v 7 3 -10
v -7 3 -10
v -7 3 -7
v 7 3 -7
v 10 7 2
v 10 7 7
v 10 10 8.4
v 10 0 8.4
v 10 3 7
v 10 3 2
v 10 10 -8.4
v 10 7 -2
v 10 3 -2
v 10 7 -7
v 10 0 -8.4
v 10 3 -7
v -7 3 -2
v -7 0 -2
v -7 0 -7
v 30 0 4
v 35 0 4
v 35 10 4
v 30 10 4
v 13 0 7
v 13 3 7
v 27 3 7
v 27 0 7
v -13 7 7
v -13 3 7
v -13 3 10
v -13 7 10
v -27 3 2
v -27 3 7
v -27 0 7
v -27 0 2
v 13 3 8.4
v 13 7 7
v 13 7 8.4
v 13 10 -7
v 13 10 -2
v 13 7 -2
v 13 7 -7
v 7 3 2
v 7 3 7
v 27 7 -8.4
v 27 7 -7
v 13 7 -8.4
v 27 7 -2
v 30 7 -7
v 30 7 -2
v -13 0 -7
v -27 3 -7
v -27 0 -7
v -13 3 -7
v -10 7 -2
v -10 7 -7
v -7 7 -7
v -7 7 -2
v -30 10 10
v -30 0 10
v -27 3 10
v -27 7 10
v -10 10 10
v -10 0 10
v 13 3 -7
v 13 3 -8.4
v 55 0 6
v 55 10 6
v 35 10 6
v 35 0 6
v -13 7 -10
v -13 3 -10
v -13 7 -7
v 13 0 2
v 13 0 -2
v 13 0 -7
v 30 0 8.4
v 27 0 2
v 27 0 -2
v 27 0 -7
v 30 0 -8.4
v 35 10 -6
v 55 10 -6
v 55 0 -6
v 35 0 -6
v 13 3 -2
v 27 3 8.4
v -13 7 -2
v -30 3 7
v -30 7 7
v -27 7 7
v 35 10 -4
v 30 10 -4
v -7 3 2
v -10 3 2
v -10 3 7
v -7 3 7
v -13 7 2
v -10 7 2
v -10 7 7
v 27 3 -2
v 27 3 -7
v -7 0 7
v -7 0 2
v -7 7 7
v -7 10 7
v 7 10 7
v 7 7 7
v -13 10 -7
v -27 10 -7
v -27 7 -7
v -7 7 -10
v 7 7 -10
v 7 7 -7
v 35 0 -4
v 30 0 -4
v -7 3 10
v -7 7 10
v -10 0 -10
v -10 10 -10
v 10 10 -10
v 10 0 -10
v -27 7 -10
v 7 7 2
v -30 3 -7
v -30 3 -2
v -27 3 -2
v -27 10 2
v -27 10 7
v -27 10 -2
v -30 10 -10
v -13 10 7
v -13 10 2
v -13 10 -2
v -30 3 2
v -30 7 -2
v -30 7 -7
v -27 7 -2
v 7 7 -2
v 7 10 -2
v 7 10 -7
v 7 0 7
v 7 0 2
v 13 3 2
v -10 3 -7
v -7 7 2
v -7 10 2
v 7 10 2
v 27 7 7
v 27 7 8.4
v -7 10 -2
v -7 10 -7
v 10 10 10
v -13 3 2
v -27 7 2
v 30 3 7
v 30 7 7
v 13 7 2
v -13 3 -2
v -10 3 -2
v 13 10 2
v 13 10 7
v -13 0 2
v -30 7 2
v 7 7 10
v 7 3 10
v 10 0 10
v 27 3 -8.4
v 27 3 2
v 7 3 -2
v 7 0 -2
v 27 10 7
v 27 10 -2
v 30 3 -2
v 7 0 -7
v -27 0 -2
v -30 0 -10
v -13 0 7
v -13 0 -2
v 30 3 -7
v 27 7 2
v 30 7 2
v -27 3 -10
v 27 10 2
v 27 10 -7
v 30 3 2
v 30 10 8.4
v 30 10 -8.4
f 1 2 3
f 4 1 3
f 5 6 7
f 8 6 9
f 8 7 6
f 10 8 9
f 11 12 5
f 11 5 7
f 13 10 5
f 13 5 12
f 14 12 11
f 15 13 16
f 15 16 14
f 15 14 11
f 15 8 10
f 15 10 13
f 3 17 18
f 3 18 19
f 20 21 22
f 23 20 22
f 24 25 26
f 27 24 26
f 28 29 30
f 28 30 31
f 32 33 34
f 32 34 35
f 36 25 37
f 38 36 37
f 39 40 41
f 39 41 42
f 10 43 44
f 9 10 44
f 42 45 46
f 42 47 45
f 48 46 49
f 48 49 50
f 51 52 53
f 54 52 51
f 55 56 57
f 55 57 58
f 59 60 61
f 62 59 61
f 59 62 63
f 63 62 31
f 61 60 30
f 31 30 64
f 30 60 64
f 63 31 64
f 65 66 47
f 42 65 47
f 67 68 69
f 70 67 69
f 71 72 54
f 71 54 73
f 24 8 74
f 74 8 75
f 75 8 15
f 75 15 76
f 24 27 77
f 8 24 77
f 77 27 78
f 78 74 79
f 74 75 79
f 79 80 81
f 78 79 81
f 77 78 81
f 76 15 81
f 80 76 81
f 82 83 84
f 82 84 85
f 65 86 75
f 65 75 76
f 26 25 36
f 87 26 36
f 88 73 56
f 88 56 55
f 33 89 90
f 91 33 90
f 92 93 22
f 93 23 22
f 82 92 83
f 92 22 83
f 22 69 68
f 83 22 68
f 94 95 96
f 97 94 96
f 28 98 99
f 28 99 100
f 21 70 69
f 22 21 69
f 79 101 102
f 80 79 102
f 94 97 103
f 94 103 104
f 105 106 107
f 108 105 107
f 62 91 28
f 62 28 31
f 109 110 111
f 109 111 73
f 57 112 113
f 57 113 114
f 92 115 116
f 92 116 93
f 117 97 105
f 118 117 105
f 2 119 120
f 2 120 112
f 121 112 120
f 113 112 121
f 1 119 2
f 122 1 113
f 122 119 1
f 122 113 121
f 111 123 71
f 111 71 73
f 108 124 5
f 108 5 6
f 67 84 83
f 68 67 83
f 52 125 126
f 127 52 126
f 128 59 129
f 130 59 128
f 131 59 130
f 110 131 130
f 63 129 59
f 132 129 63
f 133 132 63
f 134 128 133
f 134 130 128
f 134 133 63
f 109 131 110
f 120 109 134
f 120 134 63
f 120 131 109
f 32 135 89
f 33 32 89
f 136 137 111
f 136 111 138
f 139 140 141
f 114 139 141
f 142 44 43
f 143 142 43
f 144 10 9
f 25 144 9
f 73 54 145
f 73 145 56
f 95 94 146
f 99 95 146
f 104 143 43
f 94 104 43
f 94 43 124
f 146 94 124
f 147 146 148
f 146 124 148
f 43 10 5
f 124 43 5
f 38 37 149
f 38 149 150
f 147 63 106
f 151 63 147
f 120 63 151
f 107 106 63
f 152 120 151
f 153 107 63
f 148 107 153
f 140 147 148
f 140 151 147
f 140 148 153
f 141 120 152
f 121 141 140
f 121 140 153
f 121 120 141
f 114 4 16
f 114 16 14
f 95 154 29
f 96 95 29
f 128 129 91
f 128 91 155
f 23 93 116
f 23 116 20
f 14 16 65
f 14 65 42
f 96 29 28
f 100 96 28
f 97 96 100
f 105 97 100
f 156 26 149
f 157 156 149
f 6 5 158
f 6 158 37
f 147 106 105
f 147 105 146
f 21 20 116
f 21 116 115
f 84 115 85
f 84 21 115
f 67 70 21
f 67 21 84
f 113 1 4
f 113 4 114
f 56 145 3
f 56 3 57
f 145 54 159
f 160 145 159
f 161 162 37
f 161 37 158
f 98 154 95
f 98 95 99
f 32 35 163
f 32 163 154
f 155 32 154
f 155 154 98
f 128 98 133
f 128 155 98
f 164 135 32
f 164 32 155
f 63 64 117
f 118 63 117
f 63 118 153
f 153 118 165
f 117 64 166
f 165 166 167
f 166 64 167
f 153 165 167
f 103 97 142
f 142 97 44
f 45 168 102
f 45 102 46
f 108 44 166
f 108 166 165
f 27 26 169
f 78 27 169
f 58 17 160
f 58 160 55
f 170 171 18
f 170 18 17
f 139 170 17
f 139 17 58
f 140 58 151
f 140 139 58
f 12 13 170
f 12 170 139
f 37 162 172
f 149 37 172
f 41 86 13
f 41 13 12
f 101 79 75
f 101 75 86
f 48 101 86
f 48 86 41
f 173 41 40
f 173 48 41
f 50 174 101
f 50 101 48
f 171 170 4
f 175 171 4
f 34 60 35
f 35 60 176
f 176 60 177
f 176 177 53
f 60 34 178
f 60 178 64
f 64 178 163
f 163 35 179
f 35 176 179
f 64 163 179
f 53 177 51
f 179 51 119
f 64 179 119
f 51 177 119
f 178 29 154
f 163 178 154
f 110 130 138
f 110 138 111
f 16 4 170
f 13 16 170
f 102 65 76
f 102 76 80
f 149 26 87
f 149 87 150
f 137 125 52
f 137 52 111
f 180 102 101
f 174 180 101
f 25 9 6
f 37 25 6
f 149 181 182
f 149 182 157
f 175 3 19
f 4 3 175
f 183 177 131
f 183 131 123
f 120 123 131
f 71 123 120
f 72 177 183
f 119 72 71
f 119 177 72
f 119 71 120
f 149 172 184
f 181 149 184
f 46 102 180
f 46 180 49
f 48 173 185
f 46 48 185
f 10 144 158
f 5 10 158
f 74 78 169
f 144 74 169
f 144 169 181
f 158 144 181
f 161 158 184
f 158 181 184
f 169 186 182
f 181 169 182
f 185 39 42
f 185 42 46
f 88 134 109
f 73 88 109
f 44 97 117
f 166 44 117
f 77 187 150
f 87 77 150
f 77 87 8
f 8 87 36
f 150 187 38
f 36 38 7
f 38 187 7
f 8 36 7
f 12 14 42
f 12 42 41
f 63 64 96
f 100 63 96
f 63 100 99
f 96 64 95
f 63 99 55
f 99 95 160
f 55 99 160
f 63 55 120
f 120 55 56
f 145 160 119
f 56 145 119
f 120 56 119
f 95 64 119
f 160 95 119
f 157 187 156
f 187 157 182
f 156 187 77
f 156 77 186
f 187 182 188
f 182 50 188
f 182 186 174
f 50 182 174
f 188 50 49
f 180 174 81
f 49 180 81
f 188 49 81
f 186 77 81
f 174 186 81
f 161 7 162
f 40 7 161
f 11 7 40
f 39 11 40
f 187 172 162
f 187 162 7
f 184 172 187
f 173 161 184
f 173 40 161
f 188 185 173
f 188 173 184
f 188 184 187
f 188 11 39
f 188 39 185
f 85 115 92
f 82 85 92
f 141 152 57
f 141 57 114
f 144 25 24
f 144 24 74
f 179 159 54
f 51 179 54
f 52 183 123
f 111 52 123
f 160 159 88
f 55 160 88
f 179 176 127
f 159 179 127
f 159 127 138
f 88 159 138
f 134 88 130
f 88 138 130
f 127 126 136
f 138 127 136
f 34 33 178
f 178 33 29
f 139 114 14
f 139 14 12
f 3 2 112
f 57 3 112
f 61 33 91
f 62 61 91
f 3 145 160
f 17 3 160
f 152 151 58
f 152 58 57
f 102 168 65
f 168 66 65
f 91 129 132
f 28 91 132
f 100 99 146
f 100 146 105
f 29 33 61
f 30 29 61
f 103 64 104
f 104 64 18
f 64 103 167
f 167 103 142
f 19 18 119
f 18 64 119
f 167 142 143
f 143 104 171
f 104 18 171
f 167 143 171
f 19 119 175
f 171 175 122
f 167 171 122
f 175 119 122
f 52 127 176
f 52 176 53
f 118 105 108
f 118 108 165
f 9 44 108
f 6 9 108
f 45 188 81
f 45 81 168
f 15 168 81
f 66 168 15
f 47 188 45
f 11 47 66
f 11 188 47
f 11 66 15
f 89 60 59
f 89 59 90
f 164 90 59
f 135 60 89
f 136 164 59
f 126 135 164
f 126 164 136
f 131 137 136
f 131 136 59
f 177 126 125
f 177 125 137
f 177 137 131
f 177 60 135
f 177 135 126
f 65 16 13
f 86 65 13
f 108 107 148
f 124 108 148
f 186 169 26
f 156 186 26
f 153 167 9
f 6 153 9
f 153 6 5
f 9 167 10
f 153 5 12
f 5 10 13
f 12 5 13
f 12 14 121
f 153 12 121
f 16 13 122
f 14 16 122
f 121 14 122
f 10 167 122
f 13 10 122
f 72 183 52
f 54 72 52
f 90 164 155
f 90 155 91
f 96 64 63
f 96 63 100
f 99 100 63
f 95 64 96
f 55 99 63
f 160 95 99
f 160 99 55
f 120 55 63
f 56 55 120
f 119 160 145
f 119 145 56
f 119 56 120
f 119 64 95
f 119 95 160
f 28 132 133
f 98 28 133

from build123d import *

# Parameters (mm, degrees)
SKETCH_1_W           = 20
SKETCH_1_H           = 20
EXTRUDE_1_DEPTH      = 10
SKETCH_1_3_W         = 20
SKETCH_1_3_H         = 20
EXTRUDE_2_DEPTH      = 10
SKETCH_1_4_W         = 20
SKETCH_1_4_H         = 20
EXTRUDE_3_DEPTH      = 10
SKETCH_2_W           = 14
SKETCH_2_H           = 4
CUT_EXTRUDE_1_DEPTH  = 61
SKETCH_3_W           = 14
SKETCH_3_H           = 4
CUT_EXTRUDE_2_DEPTH  = 21
SKETCH_4_W           = 14
SKETCH_4_H           = 14
CUT_EXTRUDE_3_DEPTH  = 11
SKETCH_5_W           = 20
SKETCH_5_H           = 10
EXTRUDE_4_DEPTH      = 10
EXTRUDE_4_DEPTH_BACK = 10
SKETCH_6_W           = 8
SKETCH_6_H           = 10
EXTRUDE_5_DEPTH      = 5
SKETCH_7_W           = 20
SKETCH_7_H           = 10
CUT_EXTRUDE_4_DEPTH  = 1.6
CUT_EXTRUDE_START    = -20
SKETCH_7_2_W         = 20
SKETCH_7_2_H         = 10
CUT_EXTRUDE_5_DEPTH  = 1.6
SKETCH_8_W           = 20
SKETCH_8_H           = 10
CUT_EXTRUDE_6_DEPTH  = 4
SKETCH_8_2_W         = 20
SKETCH_8_2_H         = 10
CUT_EXTRUDE_9_DEPTH  = 4
SKETCH_9_W           = 4
SKETCH_9_H           = 10
EXTRUDE_6_DEPTH      = 20
SKETCH_10_W          = 4
SKETCH_10_H          = 10
EXTRUDE_7_DEPTH      = 20
SKETCH_11_W          = 4
SKETCH_11_H          = 10
EXTRUDE_8_DEPTH      = 20


with BuildPart() as part:
    # 草图1 → 凸台-拉伸1 (new body)
    with BuildSketch(Plane(origin=(0, 0, 0), x_dir=(1, 0, 0), z_dir=(0, 1, 0))):
        with Locations((-20, 0)):
            Rectangle(SKETCH_1_W, SKETCH_1_H)
    extrude(amount=EXTRUDE_1_DEPTH)


with BuildPart() as body_2:
    # 草图1<3> → 凸台-拉伸2 (new body)
    with BuildSketch(Plane(origin=(0, 0, 0), x_dir=(1, 0, 0), z_dir=(0, 1, 0))):
        Rectangle(SKETCH_1_3_W, SKETCH_1_3_H)
    extrude(amount=EXTRUDE_2_DEPTH)


with BuildPart() as body_3:
    # 草图1<4> → 凸台-拉伸3 (new body)
    with BuildSketch(Plane(origin=(0, 0, 0), x_dir=(1, 0, 0), z_dir=(0, 1, 0))):
        with Locations((20, 0)):
            Rectangle(SKETCH_1_4_W, SKETCH_1_4_H)
    extrude(amount=EXTRUDE_3_DEPTH)


with BuildPart() as cut_extrude_1_tool:
    # 草图2 → 切除-拉伸1 (new body, through all)
    with BuildSketch(Plane.ZY.offset(30)):
        with Locations((0, 5)):
            Rectangle(SKETCH_2_W, SKETCH_2_H)
    extrude(amount=-CUT_EXTRUDE_1_DEPTH)


with BuildPart() as part_1:
    add(part.part)

    # 切除-拉伸1: cut by cut_extrude_1_tool
    add(cut_extrude_1_tool.part, mode=Mode.SUBTRACT)


with BuildPart() as body_2_1:
    add(body_2.part)

    # 切除-拉伸1: cut by cut_extrude_1_tool
    add(cut_extrude_1_tool.part, mode=Mode.SUBTRACT)


with BuildPart() as body_3_1:
    add(body_3.part)

    # 切除-拉伸1: cut by cut_extrude_1_tool
    add(cut_extrude_1_tool.part, mode=Mode.SUBTRACT)


with BuildPart() as cut_extrude_2_tool:
    # 草图3 → 切除-拉伸2 (new body, through all)
    with BuildSketch(Plane(origin=(0, 0, -10), x_dir=(-1, 0, 0), z_dir=(0, 0, -1))):
        with Locations((-20, 5)):
            Rectangle(SKETCH_3_W, SKETCH_3_H)
        with Locations((0, 5)):
            Rectangle(SKETCH_3_W, SKETCH_3_H)
        with Locations((20, 5)):
            Rectangle(SKETCH_3_W, SKETCH_3_H)
    extrude(amount=-CUT_EXTRUDE_2_DEPTH)


with BuildPart() as part_2:
    add(part_1.part)

    # 切除-拉伸2: cut by cut_extrude_2_tool
    add(cut_extrude_2_tool.part, mode=Mode.SUBTRACT)


with BuildPart() as body_2_2:
    add(body_2_1.part)

    # 切除-拉伸2: cut by cut_extrude_2_tool
    add(cut_extrude_2_tool.part, mode=Mode.SUBTRACT)


with BuildPart() as body_3_2:
    add(body_3_1.part)

    # 切除-拉伸2: cut by cut_extrude_2_tool
    add(cut_extrude_2_tool.part, mode=Mode.SUBTRACT)


with BuildPart() as cut_extrude_3_tool:
    # 草图4 → 切除-拉伸3 (new body, through all)
    with BuildSketch(Plane(origin=(0, 10, 0), x_dir=(1, 0, 0), z_dir=(0, 1, 0))):
        with Locations((-20, 0)):
            Rectangle(SKETCH_4_W, SKETCH_4_H)
        Rectangle(SKETCH_4_W, SKETCH_4_H)
        with Locations((20, 0)):
            Rectangle(SKETCH_4_W, SKETCH_4_H)
    extrude(amount=-CUT_EXTRUDE_3_DEPTH)


with BuildPart() as part_3:
    add(part_2.part)

    # 切除-拉伸3: cut by cut_extrude_3_tool
    add(cut_extrude_3_tool.part, mode=Mode.SUBTRACT)

    # 草图11 → 凸台-拉伸8 (add)
    with BuildSketch(Plane.ZY.offset(30)):
        with Locations((0, 5)):
            Rectangle(SKETCH_11_W, SKETCH_11_H)
    extrude(amount=-EXTRUDE_8_DEPTH)


with BuildPart() as body_2_3:
    add(body_2_2.part)

    # 切除-拉伸3: cut by cut_extrude_3_tool
    add(cut_extrude_3_tool.part, mode=Mode.SUBTRACT)

    # 草图10 → 凸台-拉伸7 (add)
    with BuildSketch(Plane(origin=(10, 0, 0), x_dir=(0, 0, -1), z_dir=(1, 0, 0))):
        with Locations((0, 5)):
            Rectangle(SKETCH_10_W, SKETCH_10_H)
    extrude(amount=-EXTRUDE_7_DEPTH)


with BuildPart() as body_3_3:
    add(body_3_2.part)

    # 切除-拉伸3: cut by cut_extrude_3_tool
    add(cut_extrude_3_tool.part, mode=Mode.SUBTRACT)

    # 草图7 → 切除-拉伸4 (cut)
    with BuildSketch(Plane(origin=(0, 0, -10), x_dir=(-1, 0, 0), z_dir=(0, 0, -1))):
        with Locations((-20, 5)):
            Rectangle(SKETCH_7_W, SKETCH_7_H)
    extrude(amount=-CUT_EXTRUDE_4_DEPTH, mode=Mode.SUBTRACT)

    # 草图7<2> → 切除-拉伸5 (cut)
    with BuildSketch(Plane(origin=(0, 0, -10), x_dir=(-1, 0, 0), z_dir=(0, 0, -1)).offset(CUT_EXTRUDE_START)):
        with Locations((-20, 5)):
            Rectangle(SKETCH_7_2_W, SKETCH_7_2_H)
    extrude(amount=CUT_EXTRUDE_5_DEPTH, mode=Mode.SUBTRACT)

    # 草图9 → 凸台-拉伸6 (add)
    with BuildSketch(Plane.ZY.offset(-30)):
        with Locations((0, 5)):
            Rectangle(SKETCH_9_W, SKETCH_9_H)
    extrude(amount=EXTRUDE_6_DEPTH)


with BuildPart() as body_4:
    # 草图5 → 凸台-拉伸4 (new body, two sides)
    with BuildSketch(Plane.XY) as extrude_4_sk:
        with Locations((45, 5)):
            Rectangle(SKETCH_5_W, SKETCH_5_H)
    extrude(amount=EXTRUDE_4_DEPTH)
    extrude(extrude_4_sk.sketch, amount=-EXTRUDE_4_DEPTH_BACK)

    # 草图6 → 凸台-拉伸5 (add)
    with BuildSketch(Plane.ZY.offset(-35)):
        with Locations((0, 5)):
            Rectangle(SKETCH_6_W, SKETCH_6_H)
    extrude(amount=EXTRUDE_5_DEPTH)

    # 草图8 → 切除-拉伸6 (cut)
    with BuildSketch(Plane(origin=(0, 0, -10), x_dir=(-1, 0, 0), z_dir=(0, 0, -1))):
        with Locations((-45, 5)):
            Rectangle(SKETCH_8_W, SKETCH_8_H)
    extrude(amount=-CUT_EXTRUDE_6_DEPTH, mode=Mode.SUBTRACT)

    # 草图8<2> → 切除-拉伸9 (cut)
    with BuildSketch(Plane(origin=(0, 0, -10), x_dir=(-1, 0, 0), z_dir=(0, 0, -1)).offset(CUT_EXTRUDE_START)):
        with Locations((-45, 5)):
            Rectangle(SKETCH_8_2_W, SKETCH_8_2_H)
    extrude(amount=CUT_EXTRUDE_9_DEPTH, mode=Mode.SUBTRACT)


solid = Compound([part_3.part, body_2_3.part, body_3_3.part, body_4.part])
